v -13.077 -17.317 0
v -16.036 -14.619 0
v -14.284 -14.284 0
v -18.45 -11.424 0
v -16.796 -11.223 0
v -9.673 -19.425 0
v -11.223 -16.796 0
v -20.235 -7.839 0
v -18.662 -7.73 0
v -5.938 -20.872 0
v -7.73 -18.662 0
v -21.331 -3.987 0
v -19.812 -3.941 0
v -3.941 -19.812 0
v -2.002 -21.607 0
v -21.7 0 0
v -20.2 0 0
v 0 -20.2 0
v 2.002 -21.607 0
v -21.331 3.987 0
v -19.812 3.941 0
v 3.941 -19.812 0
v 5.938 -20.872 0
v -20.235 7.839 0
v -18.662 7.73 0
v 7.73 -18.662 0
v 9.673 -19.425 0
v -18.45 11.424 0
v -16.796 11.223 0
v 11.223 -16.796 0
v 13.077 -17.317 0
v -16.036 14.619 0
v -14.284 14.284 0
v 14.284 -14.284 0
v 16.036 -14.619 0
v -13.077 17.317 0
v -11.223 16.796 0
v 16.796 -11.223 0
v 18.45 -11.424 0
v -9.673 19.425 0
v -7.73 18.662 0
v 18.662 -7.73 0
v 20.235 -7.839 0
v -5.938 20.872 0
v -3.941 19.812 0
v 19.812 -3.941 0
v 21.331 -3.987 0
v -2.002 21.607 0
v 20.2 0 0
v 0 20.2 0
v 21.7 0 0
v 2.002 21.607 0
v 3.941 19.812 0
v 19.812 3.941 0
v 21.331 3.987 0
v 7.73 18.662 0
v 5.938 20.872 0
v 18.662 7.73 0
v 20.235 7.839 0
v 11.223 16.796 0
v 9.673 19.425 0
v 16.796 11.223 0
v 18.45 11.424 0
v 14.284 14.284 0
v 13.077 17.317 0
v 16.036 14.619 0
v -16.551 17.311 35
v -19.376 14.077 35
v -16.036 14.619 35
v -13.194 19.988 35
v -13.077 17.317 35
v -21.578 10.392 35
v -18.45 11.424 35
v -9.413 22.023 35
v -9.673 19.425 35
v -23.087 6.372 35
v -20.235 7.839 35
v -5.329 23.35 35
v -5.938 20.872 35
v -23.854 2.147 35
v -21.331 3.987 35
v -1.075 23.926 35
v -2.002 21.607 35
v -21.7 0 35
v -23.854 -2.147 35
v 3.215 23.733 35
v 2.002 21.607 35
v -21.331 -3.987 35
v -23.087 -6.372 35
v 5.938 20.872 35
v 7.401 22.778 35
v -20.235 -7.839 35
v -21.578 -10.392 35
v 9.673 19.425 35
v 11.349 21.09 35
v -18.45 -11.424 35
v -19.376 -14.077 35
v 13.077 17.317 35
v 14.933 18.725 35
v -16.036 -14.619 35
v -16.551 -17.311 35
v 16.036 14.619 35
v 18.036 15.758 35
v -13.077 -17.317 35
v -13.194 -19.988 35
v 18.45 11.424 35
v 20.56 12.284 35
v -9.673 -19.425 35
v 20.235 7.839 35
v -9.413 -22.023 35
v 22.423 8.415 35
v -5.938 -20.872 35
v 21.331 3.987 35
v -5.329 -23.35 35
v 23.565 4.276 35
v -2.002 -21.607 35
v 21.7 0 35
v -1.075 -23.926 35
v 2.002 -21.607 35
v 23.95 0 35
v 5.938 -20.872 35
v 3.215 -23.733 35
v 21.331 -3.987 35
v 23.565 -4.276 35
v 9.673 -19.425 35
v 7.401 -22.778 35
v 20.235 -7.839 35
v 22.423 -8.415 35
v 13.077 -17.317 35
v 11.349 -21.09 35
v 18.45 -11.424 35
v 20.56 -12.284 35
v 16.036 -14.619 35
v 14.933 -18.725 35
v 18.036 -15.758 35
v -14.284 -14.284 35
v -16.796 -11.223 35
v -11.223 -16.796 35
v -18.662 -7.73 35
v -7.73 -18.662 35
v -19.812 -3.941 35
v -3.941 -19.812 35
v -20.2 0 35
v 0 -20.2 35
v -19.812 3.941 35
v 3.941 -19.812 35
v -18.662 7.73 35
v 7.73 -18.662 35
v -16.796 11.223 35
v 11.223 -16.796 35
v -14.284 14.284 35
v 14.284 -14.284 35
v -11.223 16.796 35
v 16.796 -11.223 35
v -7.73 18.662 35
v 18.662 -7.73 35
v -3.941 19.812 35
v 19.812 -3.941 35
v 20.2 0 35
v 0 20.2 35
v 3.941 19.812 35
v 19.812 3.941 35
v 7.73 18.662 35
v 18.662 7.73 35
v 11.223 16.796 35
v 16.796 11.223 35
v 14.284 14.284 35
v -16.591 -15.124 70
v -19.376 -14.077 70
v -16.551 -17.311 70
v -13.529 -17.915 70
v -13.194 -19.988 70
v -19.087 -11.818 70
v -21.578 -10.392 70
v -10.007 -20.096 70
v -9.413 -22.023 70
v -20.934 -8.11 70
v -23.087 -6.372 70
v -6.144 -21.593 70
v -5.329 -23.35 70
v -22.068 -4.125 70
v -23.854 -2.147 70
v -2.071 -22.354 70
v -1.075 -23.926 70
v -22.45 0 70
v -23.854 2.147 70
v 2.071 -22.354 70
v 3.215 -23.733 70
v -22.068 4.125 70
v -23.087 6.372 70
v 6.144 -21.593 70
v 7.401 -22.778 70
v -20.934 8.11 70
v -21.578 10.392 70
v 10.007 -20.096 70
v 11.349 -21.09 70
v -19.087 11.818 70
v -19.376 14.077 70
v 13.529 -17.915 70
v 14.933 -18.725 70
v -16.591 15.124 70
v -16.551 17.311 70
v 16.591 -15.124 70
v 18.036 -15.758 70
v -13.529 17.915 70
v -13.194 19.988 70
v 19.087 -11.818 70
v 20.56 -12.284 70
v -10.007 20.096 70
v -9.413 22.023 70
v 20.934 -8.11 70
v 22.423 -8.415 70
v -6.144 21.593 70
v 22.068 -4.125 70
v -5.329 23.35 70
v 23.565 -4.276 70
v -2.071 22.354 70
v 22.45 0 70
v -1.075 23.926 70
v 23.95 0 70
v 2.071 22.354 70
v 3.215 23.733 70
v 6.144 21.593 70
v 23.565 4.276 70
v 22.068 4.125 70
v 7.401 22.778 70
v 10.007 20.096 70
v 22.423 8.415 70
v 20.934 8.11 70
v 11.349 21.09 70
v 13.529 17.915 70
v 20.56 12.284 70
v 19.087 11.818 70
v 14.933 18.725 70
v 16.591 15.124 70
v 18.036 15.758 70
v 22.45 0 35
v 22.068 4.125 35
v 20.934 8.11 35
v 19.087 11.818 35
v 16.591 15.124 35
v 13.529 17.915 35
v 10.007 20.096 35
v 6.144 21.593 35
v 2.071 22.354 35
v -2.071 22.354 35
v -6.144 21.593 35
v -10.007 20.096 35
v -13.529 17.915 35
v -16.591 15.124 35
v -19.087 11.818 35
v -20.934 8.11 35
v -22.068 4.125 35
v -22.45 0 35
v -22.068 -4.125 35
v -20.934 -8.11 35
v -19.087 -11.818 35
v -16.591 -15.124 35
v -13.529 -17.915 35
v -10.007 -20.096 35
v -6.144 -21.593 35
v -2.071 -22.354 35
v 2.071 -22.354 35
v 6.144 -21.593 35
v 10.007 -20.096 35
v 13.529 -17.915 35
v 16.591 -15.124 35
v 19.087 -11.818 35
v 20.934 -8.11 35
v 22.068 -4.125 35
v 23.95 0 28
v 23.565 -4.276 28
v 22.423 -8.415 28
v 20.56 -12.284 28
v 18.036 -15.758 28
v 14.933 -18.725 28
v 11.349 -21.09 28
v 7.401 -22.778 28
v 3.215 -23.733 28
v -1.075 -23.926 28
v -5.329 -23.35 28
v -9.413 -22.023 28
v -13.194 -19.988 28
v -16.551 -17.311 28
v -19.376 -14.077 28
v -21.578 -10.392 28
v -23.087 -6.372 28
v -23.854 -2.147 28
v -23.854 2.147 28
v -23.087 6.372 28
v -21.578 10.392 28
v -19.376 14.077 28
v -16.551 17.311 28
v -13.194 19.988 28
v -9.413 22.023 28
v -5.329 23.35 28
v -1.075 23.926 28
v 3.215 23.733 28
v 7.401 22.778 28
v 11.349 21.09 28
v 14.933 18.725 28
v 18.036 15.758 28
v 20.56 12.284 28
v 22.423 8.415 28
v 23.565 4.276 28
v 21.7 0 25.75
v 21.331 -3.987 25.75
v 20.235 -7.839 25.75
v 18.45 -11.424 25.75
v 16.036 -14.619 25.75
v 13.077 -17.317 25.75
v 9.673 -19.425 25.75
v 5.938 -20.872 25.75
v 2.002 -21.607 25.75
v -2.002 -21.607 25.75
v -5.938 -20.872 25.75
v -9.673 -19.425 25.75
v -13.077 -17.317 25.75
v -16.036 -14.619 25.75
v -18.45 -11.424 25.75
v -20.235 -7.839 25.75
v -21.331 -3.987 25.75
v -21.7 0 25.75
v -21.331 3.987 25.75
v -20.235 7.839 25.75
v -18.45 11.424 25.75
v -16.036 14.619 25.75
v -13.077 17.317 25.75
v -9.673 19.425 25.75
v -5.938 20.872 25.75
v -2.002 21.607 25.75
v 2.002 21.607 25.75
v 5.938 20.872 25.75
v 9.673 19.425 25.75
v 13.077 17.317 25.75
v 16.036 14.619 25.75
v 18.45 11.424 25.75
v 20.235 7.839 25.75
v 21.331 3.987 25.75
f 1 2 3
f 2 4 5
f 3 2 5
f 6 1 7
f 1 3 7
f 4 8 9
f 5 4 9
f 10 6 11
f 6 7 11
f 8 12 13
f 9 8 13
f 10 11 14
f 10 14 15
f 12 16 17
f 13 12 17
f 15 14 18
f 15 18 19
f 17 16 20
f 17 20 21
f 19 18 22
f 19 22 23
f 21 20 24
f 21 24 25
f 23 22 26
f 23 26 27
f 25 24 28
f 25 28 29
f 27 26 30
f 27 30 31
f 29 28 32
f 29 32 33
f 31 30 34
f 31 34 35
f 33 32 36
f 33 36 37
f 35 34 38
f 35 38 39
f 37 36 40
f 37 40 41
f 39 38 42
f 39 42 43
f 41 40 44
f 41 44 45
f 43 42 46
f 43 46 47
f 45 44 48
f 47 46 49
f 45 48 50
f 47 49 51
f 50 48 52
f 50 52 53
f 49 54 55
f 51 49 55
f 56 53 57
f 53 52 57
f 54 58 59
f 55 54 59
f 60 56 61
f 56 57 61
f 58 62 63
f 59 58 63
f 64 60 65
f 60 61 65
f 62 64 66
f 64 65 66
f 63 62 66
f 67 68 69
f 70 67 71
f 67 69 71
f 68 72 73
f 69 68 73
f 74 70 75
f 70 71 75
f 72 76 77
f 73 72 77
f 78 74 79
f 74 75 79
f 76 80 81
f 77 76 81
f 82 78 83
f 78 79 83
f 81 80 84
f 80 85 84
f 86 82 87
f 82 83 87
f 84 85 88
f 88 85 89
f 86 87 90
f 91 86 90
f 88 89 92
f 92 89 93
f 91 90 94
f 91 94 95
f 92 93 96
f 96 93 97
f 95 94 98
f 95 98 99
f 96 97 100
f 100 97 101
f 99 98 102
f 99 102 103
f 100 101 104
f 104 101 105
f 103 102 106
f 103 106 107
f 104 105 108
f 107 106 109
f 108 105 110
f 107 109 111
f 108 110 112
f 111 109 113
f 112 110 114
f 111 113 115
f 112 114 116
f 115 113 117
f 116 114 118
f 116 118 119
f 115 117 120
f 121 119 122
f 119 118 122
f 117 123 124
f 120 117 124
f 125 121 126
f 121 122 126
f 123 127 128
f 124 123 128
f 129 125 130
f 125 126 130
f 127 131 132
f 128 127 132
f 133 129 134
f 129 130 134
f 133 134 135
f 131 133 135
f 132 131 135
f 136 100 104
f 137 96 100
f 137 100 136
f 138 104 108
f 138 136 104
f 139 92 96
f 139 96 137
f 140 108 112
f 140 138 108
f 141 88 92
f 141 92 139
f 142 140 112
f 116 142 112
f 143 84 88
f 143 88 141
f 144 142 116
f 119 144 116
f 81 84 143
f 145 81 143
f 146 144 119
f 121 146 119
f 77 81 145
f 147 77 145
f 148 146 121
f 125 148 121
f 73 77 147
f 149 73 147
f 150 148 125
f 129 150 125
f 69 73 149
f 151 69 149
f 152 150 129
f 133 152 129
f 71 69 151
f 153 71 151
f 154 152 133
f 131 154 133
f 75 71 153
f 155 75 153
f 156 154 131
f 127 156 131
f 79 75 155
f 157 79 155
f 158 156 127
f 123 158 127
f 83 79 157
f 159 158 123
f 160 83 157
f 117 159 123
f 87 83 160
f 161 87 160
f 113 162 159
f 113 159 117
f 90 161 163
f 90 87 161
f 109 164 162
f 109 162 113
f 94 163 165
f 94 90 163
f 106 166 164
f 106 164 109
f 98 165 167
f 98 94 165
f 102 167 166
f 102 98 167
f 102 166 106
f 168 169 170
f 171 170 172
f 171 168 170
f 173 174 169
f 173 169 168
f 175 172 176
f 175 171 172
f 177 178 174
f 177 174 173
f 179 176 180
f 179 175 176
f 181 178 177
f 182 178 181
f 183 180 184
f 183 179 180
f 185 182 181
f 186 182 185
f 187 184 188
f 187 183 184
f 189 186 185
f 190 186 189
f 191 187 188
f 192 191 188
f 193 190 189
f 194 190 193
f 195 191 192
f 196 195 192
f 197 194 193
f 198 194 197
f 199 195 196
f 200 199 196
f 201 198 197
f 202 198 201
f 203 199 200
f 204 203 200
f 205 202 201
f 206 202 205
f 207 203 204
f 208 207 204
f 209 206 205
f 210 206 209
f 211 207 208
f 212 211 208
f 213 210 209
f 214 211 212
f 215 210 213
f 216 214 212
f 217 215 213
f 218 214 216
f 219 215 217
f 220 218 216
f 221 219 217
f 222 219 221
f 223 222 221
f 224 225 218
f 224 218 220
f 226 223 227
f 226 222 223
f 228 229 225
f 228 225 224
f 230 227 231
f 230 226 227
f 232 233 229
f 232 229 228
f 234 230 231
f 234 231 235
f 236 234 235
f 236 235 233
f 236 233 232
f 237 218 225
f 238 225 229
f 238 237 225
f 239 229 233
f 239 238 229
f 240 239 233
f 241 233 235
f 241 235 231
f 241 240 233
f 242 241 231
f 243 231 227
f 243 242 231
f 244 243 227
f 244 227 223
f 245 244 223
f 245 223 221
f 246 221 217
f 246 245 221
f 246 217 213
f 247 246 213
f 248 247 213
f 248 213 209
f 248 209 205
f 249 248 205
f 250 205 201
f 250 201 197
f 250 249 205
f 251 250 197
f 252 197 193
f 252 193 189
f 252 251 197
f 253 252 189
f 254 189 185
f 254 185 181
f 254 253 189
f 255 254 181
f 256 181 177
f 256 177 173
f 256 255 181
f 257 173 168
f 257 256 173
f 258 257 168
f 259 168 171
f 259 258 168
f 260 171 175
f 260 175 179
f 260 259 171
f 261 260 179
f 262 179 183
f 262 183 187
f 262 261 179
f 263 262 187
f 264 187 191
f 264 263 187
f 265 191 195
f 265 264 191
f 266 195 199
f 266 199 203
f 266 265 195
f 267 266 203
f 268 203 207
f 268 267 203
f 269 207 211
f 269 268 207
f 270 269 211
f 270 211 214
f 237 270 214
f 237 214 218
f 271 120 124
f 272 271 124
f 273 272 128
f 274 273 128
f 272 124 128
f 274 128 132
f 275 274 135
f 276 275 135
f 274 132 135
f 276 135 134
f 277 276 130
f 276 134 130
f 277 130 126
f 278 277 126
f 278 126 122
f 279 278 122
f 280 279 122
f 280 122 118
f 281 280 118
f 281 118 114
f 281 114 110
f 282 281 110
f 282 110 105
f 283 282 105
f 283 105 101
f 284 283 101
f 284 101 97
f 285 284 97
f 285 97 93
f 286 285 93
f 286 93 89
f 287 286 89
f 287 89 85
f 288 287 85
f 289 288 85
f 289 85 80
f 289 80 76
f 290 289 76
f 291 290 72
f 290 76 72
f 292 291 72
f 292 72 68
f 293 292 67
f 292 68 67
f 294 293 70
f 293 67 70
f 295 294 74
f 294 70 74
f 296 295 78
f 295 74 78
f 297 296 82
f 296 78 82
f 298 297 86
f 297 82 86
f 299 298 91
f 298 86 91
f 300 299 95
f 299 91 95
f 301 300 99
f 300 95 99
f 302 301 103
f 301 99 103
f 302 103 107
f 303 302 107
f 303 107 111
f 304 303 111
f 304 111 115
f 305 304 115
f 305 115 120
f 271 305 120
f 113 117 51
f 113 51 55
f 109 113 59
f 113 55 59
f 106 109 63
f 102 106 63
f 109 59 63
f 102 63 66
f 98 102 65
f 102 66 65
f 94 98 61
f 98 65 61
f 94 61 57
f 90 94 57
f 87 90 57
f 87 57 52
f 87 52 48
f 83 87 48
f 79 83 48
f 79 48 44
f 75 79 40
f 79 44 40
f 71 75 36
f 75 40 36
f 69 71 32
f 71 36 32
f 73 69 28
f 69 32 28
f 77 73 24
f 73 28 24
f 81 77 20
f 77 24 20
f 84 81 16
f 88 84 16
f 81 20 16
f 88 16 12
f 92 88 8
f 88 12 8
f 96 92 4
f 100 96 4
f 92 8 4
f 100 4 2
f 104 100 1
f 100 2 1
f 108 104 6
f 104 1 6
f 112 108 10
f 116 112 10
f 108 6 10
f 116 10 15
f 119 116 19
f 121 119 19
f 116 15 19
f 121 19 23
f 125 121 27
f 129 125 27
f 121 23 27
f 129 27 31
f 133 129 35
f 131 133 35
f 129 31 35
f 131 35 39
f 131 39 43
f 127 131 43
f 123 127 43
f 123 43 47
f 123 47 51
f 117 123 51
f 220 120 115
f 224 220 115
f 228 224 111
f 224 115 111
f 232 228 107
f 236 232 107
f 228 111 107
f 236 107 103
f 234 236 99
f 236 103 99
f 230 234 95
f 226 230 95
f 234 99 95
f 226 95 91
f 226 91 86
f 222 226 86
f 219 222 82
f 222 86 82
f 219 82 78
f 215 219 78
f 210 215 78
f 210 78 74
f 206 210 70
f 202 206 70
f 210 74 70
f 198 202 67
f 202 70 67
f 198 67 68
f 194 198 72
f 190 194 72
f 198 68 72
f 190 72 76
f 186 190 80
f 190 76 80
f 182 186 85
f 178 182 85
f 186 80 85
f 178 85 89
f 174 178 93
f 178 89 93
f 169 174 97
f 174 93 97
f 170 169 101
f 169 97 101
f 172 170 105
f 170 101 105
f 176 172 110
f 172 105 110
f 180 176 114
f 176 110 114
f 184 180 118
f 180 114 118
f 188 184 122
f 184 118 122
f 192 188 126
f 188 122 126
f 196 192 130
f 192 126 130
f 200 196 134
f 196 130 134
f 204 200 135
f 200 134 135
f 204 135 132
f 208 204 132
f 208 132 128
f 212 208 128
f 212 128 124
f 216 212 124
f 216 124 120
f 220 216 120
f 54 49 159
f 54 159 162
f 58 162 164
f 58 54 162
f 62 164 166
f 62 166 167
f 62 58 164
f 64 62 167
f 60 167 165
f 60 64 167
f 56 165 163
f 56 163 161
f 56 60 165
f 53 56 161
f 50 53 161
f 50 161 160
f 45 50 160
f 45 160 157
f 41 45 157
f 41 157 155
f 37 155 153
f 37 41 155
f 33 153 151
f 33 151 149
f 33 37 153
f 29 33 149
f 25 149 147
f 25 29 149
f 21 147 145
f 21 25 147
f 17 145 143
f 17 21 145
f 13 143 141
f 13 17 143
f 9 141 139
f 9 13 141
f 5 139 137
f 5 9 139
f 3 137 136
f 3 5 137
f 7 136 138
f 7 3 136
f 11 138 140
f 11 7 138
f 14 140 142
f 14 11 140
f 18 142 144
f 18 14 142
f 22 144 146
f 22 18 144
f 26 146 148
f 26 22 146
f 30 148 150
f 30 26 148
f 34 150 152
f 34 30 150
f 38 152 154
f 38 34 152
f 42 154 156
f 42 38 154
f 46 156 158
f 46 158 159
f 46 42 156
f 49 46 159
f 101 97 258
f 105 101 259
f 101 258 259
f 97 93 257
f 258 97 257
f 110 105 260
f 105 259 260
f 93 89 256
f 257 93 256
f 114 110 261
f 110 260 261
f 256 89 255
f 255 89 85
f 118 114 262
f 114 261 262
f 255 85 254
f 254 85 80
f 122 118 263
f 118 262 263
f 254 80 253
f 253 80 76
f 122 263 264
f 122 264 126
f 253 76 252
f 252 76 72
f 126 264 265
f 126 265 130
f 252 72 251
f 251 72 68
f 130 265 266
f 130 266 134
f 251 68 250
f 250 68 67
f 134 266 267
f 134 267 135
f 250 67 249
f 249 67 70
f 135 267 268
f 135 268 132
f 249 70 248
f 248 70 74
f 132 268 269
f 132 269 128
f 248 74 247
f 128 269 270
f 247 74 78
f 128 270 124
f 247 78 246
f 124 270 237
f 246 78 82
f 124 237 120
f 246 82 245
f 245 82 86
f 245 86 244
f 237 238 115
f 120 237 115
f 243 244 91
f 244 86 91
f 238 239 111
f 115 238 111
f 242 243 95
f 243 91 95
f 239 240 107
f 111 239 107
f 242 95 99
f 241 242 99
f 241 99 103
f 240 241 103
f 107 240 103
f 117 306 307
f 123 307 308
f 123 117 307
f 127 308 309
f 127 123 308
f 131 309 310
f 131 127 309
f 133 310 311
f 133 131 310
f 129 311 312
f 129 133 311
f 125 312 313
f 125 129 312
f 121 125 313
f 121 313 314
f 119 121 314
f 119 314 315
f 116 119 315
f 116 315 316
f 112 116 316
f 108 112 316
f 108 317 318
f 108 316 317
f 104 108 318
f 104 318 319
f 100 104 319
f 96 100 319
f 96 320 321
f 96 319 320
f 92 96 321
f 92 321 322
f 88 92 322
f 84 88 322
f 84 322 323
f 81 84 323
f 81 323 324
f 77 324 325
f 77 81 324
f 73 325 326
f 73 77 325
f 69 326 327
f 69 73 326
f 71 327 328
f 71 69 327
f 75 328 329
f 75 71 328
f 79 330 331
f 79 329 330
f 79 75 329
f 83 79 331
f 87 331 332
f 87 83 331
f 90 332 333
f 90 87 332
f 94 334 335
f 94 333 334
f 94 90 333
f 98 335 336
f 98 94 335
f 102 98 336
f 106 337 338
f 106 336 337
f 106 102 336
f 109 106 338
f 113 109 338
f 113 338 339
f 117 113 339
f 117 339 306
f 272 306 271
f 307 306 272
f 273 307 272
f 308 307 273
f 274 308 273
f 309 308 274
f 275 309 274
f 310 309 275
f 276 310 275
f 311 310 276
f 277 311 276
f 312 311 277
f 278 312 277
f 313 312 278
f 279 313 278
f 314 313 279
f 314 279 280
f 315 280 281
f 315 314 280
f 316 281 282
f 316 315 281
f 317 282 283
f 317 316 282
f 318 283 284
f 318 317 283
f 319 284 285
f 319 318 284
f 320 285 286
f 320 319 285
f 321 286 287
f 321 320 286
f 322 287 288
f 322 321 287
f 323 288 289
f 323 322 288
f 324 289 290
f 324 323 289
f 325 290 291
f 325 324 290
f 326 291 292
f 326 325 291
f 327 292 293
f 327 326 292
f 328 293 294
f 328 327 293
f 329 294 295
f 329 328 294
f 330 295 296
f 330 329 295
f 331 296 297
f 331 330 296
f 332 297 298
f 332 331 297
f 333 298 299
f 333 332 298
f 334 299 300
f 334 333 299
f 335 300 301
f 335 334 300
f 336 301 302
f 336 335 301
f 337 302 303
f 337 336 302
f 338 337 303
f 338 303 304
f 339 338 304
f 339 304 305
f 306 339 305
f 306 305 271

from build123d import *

# Parameters (mm, degrees)
F0_R     = 21.7
F0_R_2   = 20.2
F1_DEPTH = 35
F2_R     = 23.95
F2_R_2   = 22.45
F3_DEPTH = 35
F4_R     = 23.95
F4_R_2   = 21.7
F5_DEPTH = 10


# Not quite as in the source:
# - a fillet or chamfer that OpenCascade refuses, or shapes differently, is made with other operations: its cross-section is extruded or revolved along the edge and cut away or added


with BuildPart() as f1:
    # F0 (on Top) → F1 (new body)
    with BuildSketch(Plane.XY):
        Circle(F0_R)
        Circle(F0_R_2, mode=Mode.SUBTRACT)
    extrude(amount=F1_DEPTH)


with BuildPart() as f3:
    # F2 (on face) → F3 (new body)
    with BuildSketch(Plane.XY.offset(35)):
        Circle(F2_R)
        Circle(F2_R_2, mode=Mode.SUBTRACT)
    extrude(amount=F3_DEPTH)


with BuildPart() as f5:
    # F4 (on face) → F5 (new body)
    with BuildSketch(Plane(origin=(0, 0, 35), x_dir=(1, 0, 0), z_dir=(0, 0, -1))):
        Circle(F4_R)
        Circle(F4_R_2, mode=Mode.SUBTRACT)
    extrude(amount=F5_DEPTH)

    # F6: chamfer of 3 on 1 edges, made by hand

    # F6_s1 → F6_t2 (revolve, cut)
    with BuildSketch(Plane.XZ):
        Polygon((23.95, 28), (20.95, 25), (23.95, 25), align=None)
    revolve(axis=Axis((0, 0, 25), (0, 0, -1)), mode=Mode.SUBTRACT)


solid = Compound([f1.part, f3.part, f5.part])
